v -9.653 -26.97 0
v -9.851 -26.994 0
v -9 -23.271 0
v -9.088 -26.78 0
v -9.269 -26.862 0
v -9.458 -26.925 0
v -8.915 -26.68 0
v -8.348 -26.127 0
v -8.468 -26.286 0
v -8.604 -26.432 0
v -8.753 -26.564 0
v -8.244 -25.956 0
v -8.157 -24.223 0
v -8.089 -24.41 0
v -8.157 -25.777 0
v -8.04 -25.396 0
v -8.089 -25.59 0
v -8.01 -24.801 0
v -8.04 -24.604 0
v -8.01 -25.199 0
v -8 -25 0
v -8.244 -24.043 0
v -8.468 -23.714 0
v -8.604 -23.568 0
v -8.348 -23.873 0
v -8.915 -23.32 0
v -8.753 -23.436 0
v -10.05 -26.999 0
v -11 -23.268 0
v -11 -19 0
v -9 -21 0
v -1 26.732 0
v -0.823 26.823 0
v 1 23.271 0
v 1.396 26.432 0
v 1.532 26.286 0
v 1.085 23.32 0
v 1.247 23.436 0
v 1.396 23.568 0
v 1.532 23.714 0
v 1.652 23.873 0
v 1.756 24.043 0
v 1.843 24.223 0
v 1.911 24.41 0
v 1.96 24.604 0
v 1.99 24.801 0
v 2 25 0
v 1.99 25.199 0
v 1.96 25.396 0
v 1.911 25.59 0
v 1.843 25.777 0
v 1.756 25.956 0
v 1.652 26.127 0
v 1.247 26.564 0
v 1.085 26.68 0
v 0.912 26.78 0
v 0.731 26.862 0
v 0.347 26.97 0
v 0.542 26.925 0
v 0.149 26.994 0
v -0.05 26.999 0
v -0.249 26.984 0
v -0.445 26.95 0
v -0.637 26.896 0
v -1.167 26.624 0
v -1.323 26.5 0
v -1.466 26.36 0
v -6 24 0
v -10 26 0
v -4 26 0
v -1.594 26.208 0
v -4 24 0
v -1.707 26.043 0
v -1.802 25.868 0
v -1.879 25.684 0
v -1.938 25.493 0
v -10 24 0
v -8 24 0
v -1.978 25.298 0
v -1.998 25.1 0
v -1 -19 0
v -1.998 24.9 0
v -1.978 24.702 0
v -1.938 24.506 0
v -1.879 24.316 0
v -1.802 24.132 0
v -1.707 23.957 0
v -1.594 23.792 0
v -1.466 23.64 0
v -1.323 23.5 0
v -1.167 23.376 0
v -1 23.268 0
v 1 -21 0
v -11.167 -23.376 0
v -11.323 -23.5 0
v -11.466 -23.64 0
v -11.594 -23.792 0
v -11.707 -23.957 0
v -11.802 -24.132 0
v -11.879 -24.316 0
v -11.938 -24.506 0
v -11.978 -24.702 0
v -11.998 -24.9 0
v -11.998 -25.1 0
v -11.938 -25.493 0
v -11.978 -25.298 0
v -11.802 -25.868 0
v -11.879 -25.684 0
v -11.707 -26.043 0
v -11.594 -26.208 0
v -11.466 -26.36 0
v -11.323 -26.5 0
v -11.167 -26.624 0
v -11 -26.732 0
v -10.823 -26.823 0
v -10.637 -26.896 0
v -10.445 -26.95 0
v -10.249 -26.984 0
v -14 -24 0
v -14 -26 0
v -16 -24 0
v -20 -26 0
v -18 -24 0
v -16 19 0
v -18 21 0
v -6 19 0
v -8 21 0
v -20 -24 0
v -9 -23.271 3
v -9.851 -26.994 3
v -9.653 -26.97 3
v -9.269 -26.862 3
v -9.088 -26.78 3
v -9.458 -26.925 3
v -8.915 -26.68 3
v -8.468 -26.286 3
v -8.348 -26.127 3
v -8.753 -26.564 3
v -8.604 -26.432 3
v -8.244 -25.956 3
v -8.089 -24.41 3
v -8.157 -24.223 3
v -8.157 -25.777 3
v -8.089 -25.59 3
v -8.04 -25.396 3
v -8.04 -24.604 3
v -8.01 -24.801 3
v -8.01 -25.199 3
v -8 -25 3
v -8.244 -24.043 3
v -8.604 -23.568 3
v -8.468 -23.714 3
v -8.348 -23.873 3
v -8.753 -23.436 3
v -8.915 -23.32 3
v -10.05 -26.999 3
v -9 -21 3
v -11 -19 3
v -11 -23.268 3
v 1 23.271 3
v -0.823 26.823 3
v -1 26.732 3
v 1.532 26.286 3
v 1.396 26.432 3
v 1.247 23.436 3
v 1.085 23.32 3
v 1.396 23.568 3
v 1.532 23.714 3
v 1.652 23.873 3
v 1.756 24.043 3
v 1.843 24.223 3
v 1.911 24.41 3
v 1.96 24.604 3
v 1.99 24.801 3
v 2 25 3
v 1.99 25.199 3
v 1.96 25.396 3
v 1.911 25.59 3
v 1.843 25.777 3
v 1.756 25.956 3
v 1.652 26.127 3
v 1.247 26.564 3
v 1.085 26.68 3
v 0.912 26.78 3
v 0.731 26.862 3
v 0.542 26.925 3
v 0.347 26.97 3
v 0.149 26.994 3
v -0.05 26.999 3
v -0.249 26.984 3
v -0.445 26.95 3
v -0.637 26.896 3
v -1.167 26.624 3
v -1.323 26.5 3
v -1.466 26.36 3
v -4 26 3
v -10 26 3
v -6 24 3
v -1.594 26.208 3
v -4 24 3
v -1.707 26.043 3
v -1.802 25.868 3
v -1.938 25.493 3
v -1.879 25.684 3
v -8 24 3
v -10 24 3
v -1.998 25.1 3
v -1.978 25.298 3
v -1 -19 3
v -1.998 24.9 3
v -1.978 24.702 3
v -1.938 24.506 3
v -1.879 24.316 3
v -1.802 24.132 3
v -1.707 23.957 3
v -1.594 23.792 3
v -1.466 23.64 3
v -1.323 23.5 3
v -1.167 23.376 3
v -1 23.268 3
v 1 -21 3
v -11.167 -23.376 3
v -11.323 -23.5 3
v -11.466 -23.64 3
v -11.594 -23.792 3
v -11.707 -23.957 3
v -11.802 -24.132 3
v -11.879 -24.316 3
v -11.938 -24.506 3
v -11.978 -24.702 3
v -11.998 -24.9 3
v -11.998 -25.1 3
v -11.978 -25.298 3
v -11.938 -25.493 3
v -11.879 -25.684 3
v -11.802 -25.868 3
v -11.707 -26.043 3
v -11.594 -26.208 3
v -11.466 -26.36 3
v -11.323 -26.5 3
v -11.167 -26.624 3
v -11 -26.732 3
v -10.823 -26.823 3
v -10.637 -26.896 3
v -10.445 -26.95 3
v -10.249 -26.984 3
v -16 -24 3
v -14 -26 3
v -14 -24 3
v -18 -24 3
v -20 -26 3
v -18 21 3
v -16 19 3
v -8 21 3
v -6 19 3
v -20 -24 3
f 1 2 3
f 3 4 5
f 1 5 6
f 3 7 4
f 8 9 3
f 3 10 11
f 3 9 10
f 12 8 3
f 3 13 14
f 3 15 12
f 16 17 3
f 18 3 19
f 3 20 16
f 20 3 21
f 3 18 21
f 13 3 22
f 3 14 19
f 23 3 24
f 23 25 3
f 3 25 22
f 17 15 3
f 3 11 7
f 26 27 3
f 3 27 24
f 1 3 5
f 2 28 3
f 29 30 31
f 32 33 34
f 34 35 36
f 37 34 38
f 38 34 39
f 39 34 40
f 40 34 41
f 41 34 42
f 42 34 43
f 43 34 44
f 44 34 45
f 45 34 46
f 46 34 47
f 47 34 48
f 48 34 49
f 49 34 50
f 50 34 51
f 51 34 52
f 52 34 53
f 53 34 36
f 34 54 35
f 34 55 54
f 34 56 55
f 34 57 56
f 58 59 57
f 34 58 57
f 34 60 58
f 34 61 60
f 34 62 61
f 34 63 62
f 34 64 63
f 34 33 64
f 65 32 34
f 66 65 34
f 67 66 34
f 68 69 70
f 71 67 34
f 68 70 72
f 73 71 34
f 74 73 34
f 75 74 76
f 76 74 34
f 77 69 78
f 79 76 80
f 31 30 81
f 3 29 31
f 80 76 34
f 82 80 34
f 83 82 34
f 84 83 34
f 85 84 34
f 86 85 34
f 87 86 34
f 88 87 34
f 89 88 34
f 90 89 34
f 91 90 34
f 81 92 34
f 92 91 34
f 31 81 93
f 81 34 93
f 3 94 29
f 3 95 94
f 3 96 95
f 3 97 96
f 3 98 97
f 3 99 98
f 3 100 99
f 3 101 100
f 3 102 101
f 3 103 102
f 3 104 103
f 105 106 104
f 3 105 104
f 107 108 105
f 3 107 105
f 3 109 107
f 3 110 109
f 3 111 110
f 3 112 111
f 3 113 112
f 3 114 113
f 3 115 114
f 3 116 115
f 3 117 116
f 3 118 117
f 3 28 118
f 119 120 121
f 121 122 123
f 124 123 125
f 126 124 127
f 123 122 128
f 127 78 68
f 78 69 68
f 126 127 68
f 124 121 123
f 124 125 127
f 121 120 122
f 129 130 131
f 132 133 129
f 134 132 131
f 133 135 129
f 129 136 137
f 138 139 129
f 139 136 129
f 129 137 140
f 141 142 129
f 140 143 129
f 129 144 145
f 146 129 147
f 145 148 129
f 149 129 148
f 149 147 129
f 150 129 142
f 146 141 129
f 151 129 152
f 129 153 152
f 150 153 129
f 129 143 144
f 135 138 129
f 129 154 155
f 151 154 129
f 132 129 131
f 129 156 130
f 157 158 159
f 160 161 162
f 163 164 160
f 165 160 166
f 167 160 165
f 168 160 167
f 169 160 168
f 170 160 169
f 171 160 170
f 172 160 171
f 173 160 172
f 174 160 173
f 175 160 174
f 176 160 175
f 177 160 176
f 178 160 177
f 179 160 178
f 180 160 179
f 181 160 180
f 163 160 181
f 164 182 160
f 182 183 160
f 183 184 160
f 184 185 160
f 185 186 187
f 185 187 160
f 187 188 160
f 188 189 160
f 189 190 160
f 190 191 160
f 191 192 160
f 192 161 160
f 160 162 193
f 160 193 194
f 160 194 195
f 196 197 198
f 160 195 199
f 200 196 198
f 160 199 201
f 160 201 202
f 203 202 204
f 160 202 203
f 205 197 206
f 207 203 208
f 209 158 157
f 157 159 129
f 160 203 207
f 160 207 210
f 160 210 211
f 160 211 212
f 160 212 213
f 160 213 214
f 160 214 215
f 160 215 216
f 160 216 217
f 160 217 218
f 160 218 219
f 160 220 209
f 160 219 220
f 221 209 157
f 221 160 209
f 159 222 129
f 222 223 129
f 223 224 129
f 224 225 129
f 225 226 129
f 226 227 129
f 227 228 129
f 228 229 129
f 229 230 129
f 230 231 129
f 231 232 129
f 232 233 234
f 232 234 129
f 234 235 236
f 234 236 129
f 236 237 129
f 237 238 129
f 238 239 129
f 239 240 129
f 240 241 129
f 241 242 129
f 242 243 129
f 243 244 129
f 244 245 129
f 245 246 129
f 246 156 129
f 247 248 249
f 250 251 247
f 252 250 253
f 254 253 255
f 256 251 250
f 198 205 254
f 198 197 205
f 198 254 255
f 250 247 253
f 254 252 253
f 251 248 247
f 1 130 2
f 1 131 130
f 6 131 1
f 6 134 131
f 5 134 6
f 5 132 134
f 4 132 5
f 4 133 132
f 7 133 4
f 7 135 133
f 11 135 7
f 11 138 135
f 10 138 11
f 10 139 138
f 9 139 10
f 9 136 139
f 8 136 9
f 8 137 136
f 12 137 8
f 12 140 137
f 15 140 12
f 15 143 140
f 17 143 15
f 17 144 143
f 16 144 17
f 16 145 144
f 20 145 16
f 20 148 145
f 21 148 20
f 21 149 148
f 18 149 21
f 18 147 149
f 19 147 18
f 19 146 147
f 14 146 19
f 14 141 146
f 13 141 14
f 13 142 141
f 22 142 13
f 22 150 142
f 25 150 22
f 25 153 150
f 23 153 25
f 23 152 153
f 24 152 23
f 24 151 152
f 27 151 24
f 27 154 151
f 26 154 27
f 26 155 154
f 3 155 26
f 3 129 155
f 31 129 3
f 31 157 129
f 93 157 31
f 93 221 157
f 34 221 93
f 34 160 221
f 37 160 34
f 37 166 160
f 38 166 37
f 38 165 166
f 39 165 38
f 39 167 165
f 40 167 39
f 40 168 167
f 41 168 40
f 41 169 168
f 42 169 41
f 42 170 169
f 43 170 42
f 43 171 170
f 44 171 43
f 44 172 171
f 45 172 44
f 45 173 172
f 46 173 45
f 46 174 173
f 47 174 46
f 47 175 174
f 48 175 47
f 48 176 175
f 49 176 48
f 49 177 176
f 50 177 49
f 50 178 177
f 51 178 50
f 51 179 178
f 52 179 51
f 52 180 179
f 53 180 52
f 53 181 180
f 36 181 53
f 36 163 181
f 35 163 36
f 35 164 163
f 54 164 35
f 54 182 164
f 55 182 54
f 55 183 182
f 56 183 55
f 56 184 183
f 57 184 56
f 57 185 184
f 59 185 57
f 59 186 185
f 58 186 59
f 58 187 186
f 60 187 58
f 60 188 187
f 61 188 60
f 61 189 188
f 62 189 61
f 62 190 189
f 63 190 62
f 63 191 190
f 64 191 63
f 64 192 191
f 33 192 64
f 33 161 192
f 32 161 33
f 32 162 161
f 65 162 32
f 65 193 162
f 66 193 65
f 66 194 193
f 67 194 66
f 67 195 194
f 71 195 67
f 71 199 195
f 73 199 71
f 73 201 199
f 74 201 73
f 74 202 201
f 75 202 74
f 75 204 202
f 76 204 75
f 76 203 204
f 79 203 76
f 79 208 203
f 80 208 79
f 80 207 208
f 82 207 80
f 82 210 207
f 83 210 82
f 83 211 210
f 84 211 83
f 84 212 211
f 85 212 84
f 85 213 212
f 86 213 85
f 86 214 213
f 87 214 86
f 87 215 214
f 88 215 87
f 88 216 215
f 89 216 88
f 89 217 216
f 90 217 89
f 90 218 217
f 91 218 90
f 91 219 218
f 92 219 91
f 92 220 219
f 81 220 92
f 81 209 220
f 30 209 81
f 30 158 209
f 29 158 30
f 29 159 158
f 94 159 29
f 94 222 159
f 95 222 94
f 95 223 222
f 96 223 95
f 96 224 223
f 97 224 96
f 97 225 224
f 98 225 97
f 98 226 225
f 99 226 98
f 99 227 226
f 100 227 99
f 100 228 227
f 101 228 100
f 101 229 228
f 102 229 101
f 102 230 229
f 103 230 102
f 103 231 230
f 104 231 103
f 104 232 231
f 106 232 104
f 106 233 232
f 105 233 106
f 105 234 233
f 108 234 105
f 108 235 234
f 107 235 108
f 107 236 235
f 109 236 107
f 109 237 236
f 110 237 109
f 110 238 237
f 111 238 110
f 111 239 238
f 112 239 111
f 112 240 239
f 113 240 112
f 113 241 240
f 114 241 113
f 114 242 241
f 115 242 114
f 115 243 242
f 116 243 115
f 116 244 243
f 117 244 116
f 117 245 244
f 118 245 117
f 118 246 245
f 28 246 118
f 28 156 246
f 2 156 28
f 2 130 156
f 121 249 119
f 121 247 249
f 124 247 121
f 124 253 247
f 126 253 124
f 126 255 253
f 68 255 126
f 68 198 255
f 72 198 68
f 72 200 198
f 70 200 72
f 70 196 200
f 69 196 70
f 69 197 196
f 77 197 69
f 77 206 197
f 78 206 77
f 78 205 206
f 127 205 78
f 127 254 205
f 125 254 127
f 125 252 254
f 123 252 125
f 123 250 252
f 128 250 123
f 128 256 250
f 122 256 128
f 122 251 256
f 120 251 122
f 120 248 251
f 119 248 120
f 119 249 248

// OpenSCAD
// Model of logic gates and connectors
// File gates.scad
// Rich "Whosawhatsis" Cameron, March 2017
// Create logic gates with all permutations of inputs and outputs
// A "1" or "TRUE" is a crossbar
// A "0" or "FALSE" is circle
// And connectors, input, and output pieces

size = 30; //Scaling in mm - roughly bounding box of gate symbols

thick = 1; //Line thickness; connector lines are twice this
height = 3; //Max height above platform of gates, mm
fontsize = size / 5;
fontweight = thick;

clearance = .4; // Parameter governing clearance of parts 
                // that fit into each other

// Remove the "!" from the piece you do NOT want to print
// (gates or wires)

// To make a set of gates, 
// Replace "none" with one of the names of gates 
// listed later in the model. 
// All possible permutations of inputs and outputs
// for that gate are printed. The optional second parameter
// "rows" determines how many rows these will be split
// into on the printer platform.

!gates(none);

// Or, for wires, replace the first parameter of "wires"
// with one of the types of wires named later in the model
// to print a set of those wires. 
// The second parameter is the number of connection points.
// Negative numbers have connections on two sides
!wires(side, -5);

//gates
none = 0;
or = 1;
xor = 2;
and = 3;
not = 4;
nor = 5;
xnor = 6;
nand = 7;

//wires
side = 0; //connectors branching sideways
forward = 1; // data input, with a 1 or 0
back = 2; //feedback wires
riser = 3; //offsets two layers


$fs = .2;
$fa = 2;

// gates makes multiple instances of objects define by gate
// second parameter is how many are in a row
module gates(type, row = 2) {
   if(type == not) for(i = [0:1]) translate([
      (size + 2) * (i % row),
      (size + 15) * floor(i / row),
      0
   ]) gate(type, [i]);
   else if(type == none) wire(forward);
   else for(i = [0:3]) translate([
      (size + 2) * (i % row),
      (size + 14) * floor(i / row),
      0
   ]) gate(type, [floor(i / 2), i % 2]);
}


// Module gate makes the gates
module gate(type, in = [0, 0]) for(h = [0, height - 1]) {
   linear_extrude(height = h + 1, convexity = 5) {
      if(type % 4 == or) {
         _or(in, h ? thick : 0);
         _out(
            xor(in[0] || in[1],
            type >= not),
            h ? thick : 0,
            (type >= not) ? true : false
         );
         translate([0, -size * .15, 0]) 
            offset(fontweight/2 - fontsize * .075) text(
               (type >= not) ? "NOR" : "OR", size = fontsize,
               halign = "center",
               valign = "center",
               font = ":style=Bold"
             );
      }
      else if(type % 4 == xor) {
         _xor(in, h ? thick : 0);
         _out(
            xor(xor(in[0], in[1]), type >= not),
            h ? thick : 0,
            (type >= not) ? true : false
         );
         translate([0, -size * .08, 0])
             offset(fontweight/2 - fontsize * .075) text(
                (type >= not) ? "XNOR" : "XOR",
                size = fontsize,
                halign = "center",
                valign = "center",
                font = ":style=Bold"
             );
      }
      else if(type % 4 == and) {
         _and(in, h ? thick : 0);
         _out(
            xor(in[0] && in[1], type >= not),
            h ? thick : 0,
            (type >= not) ? true : false
         );
         translate([0, -size * .15, 0])
            offset(fontweight/2 - fontsize * .075) text(
               (type >= not) ? "NAND" : "AND",
               size = fontsize,
               halign = "center",
               valign = "center",
               font = ":style=Bold"
            );
      }
      else if(type % 4 == none) {
         if(type == not) {
            _none(in, h ? thick : 0);
            _out(
               xor(in[0], type >= not),
               h ? thick : 0,
               (type >= not) ? true : false
            );
            translate([0, -size * .25, 0])
               offset(fontweight/2 - fontsize * .075) text(
                  (type >= not) ? "NOT" : "",
                  size = fontsize,
                  halign = "center",
                  valign = "center",
                  font = ":style=Bold"
               );
         } else _forwardwire([in[0]], h ? thick : 0);
      }
   }
}

module wires(type, value = 1) {
   if(type == side) wire(type, [(value < 1) ? 1 : 0, abs(value)]);
   else wire(type);
}

module wire(type, w = [0, 1]) {
   if(type == side) {
      linear_extrude(height = height, convexity = 5) for(i = [0, 1])
         translate(
            i * [-size * 2 / 3 * (w[1]) - thick,
            -thick * 4,
            0
         ]) rotate(i * 180) _crosswire([i], thick, w = w);
   } else if(type == forward) {
      linear_extrude(height = height, convexity = 5) for(i = [0, 1])
         translate(i * [-size / 3 - thick * 7, 0, 0]) rotate(i * 180)
            _forwardwire([i], thick);
   } else if(type == back) {
      linear_extrude(height = height, convexity = 5) for(i = [0, 1])
         translate(i * [-thick * 4, 10 + thick + 5, 0])
            _backwire([i], thick);
   } else if(type == riser) {
      for(i = [0, 1]) translate(i * [0, 0, 0]) rotate(i * 180)
         _wireriser([i], thick, height);
   }
}

// OpenSCAD doesn't have a built-in xor operator, so we need a
// function.
function xor(a, b) = (a || b) && !(a && b); 

module _or(in = [0, 0], width = 0, l = 10) difference() {
   union() {
      if(l) _in(in, width, l = l);
      difference() {
         intersection_for(i = [-1, 1])
            translate([i * size / 2, -size * .366, 0]) circle(size);
         translate([0, -size - size * .366, 0]) circle(size);
      }
   }
   if(width) offset(-width) _or(l = 0);
}

module _xor(in = [0, 0], width = 0, l = 10) difference() {
   union() {
      if(l) _in(in, width, l = l);
      _or(l = 0);
   }
   if(width) union() {
      offset(-width) difference() {
         _or(l = 0);
         translate([0, -size - size * .366, 0])
            circle(size + width * 3);
      }
      translate([0, -size - size * .366, 0]) difference() {
         circle(size + width * 3);
         circle(size + width);
      }
   }
}

module _and(in = [0, 0], width = 0, l = 10) difference() {
   union() {
      if(l) _in(in, width, l = l);
      hull() {
         circle(size / 2);
         translate([-size / 2, -size / 2, 0])
            square([size, size / 4]);
      }
   }
   if(width) offset(-width) _and(l = 0);
}

// generic gate symbol (used for NOT)
module _none(in = [0], width = 0, l = 10) difference() {
   union() {
      if(l) _in(in, width, l = l);
      hull() {
         translate([0, size * .45, 0]) circle(size * .05);
         translate([-size * .45, -size * .45, 0]) circle(size * .05);
         translate([size * .45, -size * .45, 0]) circle(size * .05);
      }
   }
   if(width) offset(-width) _none(l = 0);
}

// Create connectors 

module _forwardwire(in = [0], width = 0, l = 10) {
   for(i = [0:len(in) - 1]) translate([
      (len(in) > 1) ? size * 2 / 6 / (len(in) - 1) * i - size / 6 : 0,
      0,
      0
   ]) {
      _in(in, width, l = l);
      _out(in[0], width, l = l);
      square([width * 2, size], center = true);
   }
}

module _backwire(in = [0], width = 0, l = 10) {
   for(i = [0:len(in) - 1]) translate([
      (len(in) > 1) ? size * 2 / 6 / (len(in) - 1) * i - size / 6 : 0,
      0,
      0
   ]) {
      for(i = [0, 1]) rotate(180 * i) {
         translate([
            -size / 2,
            -size - l * 3,
            0
         ]) _out(in[0], width, l = l);
         translate([-width, size / 2 + l * 3, 0])
            square([size / 2 + width * 2, width * 2]);
      }
      square([width * 2, size + l * 6], center = true);
   }
}

module _forwardwire(in = [0], width = 0, l = 10) {
   for(i = [0:len(in) - 1]) translate([
      (len(in) > 1) ? size * 2 / 6 / (len(in) - 1) * i - size / 6 : 0,
      0,
      0
   ]) {
      _in(in, width, l = l);
      _out(in[0], width, l = l);
      square([width * 2, size], center = true);
   }
}

module _crosswire(in = [0], width = 0, l = 10, w = [0, 0]) {
   for(side = [0, 1]) mirror([side, 0, 0]) if(w[side]) difference() {
      union() {
         translate([-width, -width, 0])
            square([
               size * 2 / 3 * (w[side] - .5) + width * 2,
               width * 2
            ]);
         for(i = [1:w[side]]) translate([
            size * 2 / 3 * (i - .5),
            0,
            0
         ]) {
            translate([0, l / 4, 0])
               square([width * 2, l / 2], center = true);
            translate([0, l / 2, 0]) offset(width * 2 + clearance)
               _end(in[0], width);
         }
         translate([0, -l / 4, 0])
            square([width * 2, l / 2], center = true);
         translate([0, -l / 2, 0]) offset(width * 2 + clearance)
            _end(in[0], width);
      }
      offset(clearance) {
         for(i = [1:w[side]]) translate([
            size * 2 / 3 * (i - .5),
            0,
            0
         ]) {
            translate([0, l / 2 + width * 2, 0])
               square([width * 2, width * 4], center = true);
            translate([0, l / 2, 0]) _end(in[0], width);
         }
         translate([0, -l / 2 - width * 2, 0])
            square([width * 2, width * 4], center = true);
         translate([0, -l / 2, 0]) _end(in[0], width);
      }
   }
}

module _wireriser(in = [0], width = 0, h = height) {
   translate([0, -10, 0]) difference() {
      union() {
         linear_extrude(h + 2) offset(width * 2)
            _out(in[0], width, l = 0);
         linear_extrude(h * 2 + 2, convexity = 5) intersection() {
            offset(width * 2) _out(in[0], width, l = 0);
            translate([0, -width * 5, 0])
               _out(in[0], width, l = width * 5);
         }
      }
      translate([0, -width * 5, 0])
         linear_extrude(h * 2 + 2, center = true, convexity = 5)
            offset(clearance) _out(in[0], width, l = width * 5);
   }
}

module _in(in = [0], width = 0, l = 10) for(i = [0:len(in) - 1]) {
   translate([size * 2 / 3 * i - size / 3, 0, 0]) {
      if(len(in) > 1) translate([0, -size * .4 - l / 2, 0])
         square([width * 2, l + size * .2], center = true);
      else {
         translate([-width, -size / 2 - l / 2 - width, 0])
            square([size / 3 + width * 2, width * 2]);
         translate([size / 3, -size * .4, 0])
            square([width * 2, l + size * .2], center = true);
         translate([
            0,
            -size * .4 - l / 2 - (l / 2 + size * .2) / 2,
            0
         ]) square([width * 2, l / 2], center = true);
      }
      translate([0, -size / 2 - l, 0]) {
         _end(in[i], width);
      }
   }
}

module _out(out = 0, width = 0, inverting = false, l = 10) {
   difference() {
      union() {
         translate([0, size / 2 + l / 2 - .5, 0])
            square([width * 2, l + .5], center = true);
         translate([0, size / 2 + l, 0]) _end(out, width);
         if(inverting) translate([
            0,
            size * .5 - thick + thick * 2.5,
            0
         ]) circle(thick * 2.5);
      }
      if(width) offset(-width) _out(inverting = inverting, l = 0);
   }
}

module _end(on = true, width = 0) {
   if(on) square([width * 6, width * 2], center = true);
   else circle(width * 2);
} // end model
